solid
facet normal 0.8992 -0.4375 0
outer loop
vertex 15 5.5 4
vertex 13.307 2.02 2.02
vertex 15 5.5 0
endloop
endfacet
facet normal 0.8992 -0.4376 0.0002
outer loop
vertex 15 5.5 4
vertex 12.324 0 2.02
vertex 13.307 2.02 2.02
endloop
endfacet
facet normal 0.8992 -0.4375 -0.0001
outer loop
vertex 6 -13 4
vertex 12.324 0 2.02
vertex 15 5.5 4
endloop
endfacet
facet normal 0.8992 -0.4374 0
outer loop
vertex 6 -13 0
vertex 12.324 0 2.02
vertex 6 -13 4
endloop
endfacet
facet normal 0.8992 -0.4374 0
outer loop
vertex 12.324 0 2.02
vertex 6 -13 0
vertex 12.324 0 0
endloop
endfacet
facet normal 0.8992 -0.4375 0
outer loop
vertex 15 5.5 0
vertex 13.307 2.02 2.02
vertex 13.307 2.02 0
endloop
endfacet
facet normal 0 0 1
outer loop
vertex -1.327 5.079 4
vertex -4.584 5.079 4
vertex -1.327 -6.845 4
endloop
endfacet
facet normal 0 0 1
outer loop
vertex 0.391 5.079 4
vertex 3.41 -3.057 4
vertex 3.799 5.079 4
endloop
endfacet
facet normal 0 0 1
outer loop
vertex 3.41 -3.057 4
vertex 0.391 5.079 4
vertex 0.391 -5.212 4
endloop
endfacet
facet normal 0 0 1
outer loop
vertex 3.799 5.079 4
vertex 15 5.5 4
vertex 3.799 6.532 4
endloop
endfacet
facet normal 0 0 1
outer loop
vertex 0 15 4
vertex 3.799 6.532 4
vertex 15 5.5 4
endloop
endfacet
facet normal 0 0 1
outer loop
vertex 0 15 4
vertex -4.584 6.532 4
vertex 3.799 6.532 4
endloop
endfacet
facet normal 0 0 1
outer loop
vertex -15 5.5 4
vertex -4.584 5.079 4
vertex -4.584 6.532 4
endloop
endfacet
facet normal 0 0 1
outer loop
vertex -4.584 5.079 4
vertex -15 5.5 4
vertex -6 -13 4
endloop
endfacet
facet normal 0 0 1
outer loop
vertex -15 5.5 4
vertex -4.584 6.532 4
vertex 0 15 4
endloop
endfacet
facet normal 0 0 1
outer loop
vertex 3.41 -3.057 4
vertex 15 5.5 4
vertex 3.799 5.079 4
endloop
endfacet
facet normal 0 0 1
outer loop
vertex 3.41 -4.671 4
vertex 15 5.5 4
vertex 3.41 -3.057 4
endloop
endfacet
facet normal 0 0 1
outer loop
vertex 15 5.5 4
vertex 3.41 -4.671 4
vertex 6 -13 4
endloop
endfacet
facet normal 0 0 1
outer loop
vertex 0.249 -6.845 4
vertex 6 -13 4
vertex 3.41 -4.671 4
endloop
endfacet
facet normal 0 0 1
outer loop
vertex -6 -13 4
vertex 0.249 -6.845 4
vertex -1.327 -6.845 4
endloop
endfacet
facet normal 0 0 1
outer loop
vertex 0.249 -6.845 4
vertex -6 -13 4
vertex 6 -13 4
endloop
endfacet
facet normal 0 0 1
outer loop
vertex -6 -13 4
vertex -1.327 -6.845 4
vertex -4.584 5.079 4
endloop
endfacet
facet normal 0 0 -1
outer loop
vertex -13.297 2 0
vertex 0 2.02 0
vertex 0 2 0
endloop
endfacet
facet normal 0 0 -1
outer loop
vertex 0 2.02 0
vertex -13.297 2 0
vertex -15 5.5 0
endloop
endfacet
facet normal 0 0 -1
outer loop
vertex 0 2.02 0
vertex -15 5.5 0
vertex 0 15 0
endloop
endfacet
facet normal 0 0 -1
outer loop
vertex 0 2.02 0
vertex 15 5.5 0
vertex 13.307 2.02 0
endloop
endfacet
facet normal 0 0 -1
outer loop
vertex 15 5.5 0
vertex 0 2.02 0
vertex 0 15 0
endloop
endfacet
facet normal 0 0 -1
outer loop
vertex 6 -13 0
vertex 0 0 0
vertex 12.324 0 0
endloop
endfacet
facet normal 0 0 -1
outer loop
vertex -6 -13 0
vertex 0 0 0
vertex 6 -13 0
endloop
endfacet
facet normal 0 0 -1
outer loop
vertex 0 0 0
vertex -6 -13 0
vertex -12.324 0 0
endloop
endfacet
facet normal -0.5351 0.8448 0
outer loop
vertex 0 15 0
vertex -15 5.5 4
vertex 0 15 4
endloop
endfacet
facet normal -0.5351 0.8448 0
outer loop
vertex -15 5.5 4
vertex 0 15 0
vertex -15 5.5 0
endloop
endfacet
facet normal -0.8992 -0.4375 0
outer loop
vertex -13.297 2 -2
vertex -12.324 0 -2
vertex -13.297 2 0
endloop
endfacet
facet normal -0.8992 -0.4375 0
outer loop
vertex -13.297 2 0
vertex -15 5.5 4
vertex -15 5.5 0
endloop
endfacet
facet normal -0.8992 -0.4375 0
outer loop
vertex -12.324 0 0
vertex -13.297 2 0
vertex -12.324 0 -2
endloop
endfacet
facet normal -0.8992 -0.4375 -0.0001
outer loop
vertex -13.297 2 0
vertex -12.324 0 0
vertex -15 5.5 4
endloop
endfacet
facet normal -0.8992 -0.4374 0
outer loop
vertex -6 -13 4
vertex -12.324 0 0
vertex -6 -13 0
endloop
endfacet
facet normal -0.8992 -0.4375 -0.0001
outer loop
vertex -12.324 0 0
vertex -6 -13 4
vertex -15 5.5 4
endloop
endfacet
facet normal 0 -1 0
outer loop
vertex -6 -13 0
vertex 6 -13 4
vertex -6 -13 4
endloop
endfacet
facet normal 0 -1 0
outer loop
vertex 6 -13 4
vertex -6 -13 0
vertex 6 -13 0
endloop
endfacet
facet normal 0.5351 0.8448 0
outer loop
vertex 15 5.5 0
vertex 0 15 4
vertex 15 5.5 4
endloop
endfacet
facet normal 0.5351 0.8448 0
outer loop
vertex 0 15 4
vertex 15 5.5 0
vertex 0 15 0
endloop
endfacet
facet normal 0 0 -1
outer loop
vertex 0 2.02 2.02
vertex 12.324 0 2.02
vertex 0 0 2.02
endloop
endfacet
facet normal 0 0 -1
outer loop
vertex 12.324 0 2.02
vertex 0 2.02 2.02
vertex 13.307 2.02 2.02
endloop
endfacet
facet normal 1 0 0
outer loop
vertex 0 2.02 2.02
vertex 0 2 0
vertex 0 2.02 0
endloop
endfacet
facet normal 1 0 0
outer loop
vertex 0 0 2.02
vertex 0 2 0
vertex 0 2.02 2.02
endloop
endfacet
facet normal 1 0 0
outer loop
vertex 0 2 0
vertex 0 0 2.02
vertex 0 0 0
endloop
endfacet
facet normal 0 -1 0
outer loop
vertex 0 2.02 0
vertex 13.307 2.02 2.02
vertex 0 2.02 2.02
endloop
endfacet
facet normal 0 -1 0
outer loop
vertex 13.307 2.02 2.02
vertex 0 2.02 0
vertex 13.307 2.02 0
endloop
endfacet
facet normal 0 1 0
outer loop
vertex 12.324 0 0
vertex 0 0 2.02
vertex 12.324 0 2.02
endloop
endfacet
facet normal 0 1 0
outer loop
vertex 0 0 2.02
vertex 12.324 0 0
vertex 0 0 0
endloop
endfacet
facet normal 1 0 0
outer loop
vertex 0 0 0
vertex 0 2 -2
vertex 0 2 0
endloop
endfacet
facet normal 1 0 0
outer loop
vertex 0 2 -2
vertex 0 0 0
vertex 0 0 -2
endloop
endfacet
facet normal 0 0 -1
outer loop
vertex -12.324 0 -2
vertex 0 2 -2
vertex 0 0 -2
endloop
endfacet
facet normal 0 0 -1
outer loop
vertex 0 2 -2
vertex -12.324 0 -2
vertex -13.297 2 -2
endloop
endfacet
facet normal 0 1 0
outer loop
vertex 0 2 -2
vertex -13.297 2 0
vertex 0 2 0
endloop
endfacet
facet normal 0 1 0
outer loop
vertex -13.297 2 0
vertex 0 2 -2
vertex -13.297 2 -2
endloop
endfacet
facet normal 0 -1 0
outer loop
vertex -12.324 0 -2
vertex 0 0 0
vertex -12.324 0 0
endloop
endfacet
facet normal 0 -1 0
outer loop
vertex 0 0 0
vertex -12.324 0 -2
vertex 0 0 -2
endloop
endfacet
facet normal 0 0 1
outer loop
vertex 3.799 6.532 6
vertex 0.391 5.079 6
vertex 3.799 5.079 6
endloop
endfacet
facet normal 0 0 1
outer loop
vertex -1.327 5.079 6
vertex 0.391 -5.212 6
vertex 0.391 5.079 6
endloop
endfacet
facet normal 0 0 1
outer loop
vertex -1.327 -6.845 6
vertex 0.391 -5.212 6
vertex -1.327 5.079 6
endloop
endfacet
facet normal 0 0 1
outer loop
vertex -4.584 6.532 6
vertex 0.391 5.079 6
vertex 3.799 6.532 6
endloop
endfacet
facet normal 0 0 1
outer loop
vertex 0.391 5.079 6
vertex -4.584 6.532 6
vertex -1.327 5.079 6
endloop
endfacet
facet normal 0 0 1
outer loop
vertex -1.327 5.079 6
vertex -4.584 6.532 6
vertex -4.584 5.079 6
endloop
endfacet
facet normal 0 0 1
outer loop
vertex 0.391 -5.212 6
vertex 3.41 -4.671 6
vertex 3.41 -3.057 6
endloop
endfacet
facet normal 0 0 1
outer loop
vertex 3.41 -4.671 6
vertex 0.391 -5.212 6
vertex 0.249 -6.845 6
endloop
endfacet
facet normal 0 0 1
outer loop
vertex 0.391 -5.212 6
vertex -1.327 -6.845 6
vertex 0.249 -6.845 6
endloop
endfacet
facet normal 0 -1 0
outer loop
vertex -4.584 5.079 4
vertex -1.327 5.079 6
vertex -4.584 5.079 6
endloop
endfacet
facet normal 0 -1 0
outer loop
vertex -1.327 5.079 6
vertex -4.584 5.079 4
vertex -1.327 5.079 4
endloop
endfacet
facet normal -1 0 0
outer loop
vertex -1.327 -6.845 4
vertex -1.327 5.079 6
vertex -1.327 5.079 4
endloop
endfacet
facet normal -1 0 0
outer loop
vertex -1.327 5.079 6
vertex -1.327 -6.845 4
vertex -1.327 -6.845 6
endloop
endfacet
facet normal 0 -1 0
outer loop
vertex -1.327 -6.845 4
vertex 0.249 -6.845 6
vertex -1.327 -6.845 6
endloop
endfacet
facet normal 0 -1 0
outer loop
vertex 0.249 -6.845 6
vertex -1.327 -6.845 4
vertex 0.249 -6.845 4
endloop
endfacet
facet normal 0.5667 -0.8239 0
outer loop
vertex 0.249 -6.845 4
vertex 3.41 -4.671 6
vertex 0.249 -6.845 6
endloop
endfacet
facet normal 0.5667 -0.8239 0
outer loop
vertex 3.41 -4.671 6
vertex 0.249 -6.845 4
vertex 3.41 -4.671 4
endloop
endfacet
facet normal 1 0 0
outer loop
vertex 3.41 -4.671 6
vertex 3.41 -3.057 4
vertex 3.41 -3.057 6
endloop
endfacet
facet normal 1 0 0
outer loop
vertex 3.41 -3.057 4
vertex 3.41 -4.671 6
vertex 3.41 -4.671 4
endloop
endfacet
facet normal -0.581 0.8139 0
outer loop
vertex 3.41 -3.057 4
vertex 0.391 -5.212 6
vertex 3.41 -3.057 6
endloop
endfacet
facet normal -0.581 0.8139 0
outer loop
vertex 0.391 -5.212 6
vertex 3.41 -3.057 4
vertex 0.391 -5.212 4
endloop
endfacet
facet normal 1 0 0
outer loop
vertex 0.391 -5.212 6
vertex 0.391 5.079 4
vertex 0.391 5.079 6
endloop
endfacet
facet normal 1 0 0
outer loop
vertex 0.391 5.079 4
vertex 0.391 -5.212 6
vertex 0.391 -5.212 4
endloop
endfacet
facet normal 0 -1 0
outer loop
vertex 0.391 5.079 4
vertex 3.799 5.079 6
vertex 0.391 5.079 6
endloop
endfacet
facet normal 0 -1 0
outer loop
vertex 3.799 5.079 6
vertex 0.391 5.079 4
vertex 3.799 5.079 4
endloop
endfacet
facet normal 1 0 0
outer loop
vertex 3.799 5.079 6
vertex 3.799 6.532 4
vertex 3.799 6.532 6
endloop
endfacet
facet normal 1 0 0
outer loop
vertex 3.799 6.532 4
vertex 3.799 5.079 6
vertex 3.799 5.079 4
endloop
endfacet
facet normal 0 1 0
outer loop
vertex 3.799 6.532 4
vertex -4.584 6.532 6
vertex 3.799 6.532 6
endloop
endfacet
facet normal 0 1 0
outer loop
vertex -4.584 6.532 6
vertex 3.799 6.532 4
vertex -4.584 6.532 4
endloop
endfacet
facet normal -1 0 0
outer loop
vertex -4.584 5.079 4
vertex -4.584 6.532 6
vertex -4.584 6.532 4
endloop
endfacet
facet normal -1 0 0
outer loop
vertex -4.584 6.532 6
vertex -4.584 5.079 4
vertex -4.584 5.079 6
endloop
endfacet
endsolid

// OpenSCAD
content = "1";

bottomX = 6;
middleX = 15;
topY = 28;
middleY = 18.5;

baseHeight = 4;
totalHeight = 6;
textSize = 14;
textHeight = totalHeight - baseHeight;
fitFactor = 1.01;

cutWidth = 2;
cutDepth = baseHeight/2;

$fn = 360;

item(content);
//view();
//print();

corners = [[-bottomX, 0], [bottomX, 0], [middleX, middleY], [0, topY], [-middleX, middleY]];

module print(){
	item("1");
	translate([2*middleX + cutWidth, 0, 0]) item("2"); 
	translate([2*(2*middleX + cutWidth), 0, 0]) item("3"); 
	translate([3*(2*middleX + cutWidth), 0, 0]) item("4"); 
	translate([4*(2*middleX + cutWidth), 0, 0]) item("5"); 
}

module view() {
	item("1");
	translate([0, 0, 0]) rotate([0, 180, 0]) item("1");
}

module item(content) {
	color("black") base();
	rotate([0, 0, 180]) translate([0, 0, baseHeight]) color("red") label(content);
}

module base() {
	difference() {
		basePoly();
		cutter(fitFactor);
	}
	intersection() {
		translate([-middleX, 0, -cutDepth]) cutter(1);
		translate([0, 0, -baseHeight]) basePoly();
	}
}

module basePoly() {
	linear_extrude(baseHeight) translate([0, -13, 0]) polygon(points = corners);
}

module label(content) {
	linear_extrude(textHeight) text(text = content, size = textSize, font = "Arial", halign = "center", valign = "center");
}

module cutter(factor) {
	cube([middleX*factor, cutWidth*factor, cutDepth*factor]);
}
